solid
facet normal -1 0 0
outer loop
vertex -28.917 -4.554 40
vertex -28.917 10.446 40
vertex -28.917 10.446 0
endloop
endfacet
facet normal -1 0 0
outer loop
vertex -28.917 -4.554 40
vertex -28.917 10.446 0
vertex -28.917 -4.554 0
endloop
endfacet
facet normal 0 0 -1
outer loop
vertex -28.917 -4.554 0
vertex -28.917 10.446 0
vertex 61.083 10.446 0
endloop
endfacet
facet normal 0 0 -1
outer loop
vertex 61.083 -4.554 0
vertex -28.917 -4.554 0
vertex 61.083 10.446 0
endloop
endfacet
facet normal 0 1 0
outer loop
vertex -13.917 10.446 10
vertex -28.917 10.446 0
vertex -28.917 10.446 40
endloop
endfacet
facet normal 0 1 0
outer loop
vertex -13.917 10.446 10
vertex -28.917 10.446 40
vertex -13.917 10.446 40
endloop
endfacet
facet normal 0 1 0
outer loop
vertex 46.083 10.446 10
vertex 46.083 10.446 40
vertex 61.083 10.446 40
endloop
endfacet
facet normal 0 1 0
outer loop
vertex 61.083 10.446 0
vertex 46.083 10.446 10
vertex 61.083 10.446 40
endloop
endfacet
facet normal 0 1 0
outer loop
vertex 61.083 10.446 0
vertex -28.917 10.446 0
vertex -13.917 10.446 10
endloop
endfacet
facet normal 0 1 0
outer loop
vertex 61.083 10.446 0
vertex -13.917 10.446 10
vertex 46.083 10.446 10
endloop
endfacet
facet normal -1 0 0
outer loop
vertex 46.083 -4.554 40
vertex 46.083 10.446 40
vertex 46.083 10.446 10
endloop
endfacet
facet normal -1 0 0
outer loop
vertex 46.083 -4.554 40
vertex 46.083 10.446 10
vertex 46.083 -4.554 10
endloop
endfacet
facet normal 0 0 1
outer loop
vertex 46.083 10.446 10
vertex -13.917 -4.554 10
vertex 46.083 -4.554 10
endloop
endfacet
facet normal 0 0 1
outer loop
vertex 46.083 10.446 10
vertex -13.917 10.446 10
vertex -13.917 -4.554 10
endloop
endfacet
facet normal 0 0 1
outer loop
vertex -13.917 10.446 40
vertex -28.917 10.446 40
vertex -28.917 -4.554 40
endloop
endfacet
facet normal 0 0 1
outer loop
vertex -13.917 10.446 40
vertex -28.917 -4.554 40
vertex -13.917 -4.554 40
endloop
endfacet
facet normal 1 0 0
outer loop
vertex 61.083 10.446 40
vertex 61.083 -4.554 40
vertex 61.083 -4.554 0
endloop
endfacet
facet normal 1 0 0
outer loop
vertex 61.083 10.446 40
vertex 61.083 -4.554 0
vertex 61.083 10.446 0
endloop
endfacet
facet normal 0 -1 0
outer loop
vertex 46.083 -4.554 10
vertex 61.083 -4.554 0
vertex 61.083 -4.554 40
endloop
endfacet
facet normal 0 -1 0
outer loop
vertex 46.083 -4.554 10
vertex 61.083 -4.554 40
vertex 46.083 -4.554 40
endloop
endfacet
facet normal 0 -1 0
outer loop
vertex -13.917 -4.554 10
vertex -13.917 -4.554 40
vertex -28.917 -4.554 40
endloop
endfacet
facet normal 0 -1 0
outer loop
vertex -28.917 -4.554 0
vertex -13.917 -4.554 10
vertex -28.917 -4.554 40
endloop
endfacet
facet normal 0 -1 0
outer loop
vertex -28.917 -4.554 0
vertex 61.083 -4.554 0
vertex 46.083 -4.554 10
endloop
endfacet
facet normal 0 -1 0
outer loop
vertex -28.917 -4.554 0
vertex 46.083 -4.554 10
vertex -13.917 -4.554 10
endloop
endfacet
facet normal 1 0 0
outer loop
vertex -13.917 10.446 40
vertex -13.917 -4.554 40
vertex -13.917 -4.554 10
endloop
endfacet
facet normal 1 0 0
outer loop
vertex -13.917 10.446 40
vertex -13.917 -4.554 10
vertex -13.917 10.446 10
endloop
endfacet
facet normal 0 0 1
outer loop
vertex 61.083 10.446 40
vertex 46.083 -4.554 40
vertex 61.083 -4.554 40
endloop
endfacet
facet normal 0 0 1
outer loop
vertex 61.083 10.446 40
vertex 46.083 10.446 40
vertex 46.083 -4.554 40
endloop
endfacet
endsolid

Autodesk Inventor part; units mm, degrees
ref_plane "YZ Plane" through (0, 0, 0) normal (1, 0, 0) x (0, 1, 0)
ref_plane "XZ Plane" through (0, 0, 0) normal (0, 1, 0) x (-1, 0, 0)
ref_plane "XY Plane" through (0, 0, 0) normal (0, 0, 1) x (1, 0, 0)
sketch "Sketch3" plane through (0, 0, 0) normal (0, 0, 1) x (1, 0, 0)
  line L0 (-13.9172, 10.4459) -> (46.0828, 10.4459)
  line L1 (46.0828, 10.4459) -> (46.0828, -4.5541)
  line L2 (46.0828, -4.5541) -> (-13.9172, -4.5541)
  line L3 (-13.9172, -4.5541) -> (-13.9172, 10.4459)
  line L4 (46.0828, -4.5541) -> (61.0828, -4.5541)
  line L5 (61.0828, -4.5541) -> (61.0828, 10.4459)
  line L6 (61.0828, 10.4459) -> (46.0828, 10.4459)
  line L7 (46.0828, 10.4459) -> (46.0828, -4.5541)
  line L8 (-13.9172, 10.4459) -> (-28.9172, 10.4459)
  line L9 (-28.9172, 10.4459) -> (-28.9172, -4.5541)
  line L10 (-28.9172, -4.5541) -> (-13.9172, -4.5541)
  line L11 (-13.9172, -4.5541) -> (-13.9172, 10.4459)
  point P0 (0, 0)
  dimension "d0" = 15
  dimension "d1" = 15
  dimension "d2" = 15
  dimension "d3" = 60
extrude "Extrusion1" add sketch "Sketch3" along normal blind 10 contours L0 L1 L2 L3
extrude "Extrusion2" add sketch "Sketch3" along normal blind 40 contours L3 L10 L9 L8 | L6 L5 L4 L1
equation "\"d2\" = d1"
properties part number "HandleR01"
